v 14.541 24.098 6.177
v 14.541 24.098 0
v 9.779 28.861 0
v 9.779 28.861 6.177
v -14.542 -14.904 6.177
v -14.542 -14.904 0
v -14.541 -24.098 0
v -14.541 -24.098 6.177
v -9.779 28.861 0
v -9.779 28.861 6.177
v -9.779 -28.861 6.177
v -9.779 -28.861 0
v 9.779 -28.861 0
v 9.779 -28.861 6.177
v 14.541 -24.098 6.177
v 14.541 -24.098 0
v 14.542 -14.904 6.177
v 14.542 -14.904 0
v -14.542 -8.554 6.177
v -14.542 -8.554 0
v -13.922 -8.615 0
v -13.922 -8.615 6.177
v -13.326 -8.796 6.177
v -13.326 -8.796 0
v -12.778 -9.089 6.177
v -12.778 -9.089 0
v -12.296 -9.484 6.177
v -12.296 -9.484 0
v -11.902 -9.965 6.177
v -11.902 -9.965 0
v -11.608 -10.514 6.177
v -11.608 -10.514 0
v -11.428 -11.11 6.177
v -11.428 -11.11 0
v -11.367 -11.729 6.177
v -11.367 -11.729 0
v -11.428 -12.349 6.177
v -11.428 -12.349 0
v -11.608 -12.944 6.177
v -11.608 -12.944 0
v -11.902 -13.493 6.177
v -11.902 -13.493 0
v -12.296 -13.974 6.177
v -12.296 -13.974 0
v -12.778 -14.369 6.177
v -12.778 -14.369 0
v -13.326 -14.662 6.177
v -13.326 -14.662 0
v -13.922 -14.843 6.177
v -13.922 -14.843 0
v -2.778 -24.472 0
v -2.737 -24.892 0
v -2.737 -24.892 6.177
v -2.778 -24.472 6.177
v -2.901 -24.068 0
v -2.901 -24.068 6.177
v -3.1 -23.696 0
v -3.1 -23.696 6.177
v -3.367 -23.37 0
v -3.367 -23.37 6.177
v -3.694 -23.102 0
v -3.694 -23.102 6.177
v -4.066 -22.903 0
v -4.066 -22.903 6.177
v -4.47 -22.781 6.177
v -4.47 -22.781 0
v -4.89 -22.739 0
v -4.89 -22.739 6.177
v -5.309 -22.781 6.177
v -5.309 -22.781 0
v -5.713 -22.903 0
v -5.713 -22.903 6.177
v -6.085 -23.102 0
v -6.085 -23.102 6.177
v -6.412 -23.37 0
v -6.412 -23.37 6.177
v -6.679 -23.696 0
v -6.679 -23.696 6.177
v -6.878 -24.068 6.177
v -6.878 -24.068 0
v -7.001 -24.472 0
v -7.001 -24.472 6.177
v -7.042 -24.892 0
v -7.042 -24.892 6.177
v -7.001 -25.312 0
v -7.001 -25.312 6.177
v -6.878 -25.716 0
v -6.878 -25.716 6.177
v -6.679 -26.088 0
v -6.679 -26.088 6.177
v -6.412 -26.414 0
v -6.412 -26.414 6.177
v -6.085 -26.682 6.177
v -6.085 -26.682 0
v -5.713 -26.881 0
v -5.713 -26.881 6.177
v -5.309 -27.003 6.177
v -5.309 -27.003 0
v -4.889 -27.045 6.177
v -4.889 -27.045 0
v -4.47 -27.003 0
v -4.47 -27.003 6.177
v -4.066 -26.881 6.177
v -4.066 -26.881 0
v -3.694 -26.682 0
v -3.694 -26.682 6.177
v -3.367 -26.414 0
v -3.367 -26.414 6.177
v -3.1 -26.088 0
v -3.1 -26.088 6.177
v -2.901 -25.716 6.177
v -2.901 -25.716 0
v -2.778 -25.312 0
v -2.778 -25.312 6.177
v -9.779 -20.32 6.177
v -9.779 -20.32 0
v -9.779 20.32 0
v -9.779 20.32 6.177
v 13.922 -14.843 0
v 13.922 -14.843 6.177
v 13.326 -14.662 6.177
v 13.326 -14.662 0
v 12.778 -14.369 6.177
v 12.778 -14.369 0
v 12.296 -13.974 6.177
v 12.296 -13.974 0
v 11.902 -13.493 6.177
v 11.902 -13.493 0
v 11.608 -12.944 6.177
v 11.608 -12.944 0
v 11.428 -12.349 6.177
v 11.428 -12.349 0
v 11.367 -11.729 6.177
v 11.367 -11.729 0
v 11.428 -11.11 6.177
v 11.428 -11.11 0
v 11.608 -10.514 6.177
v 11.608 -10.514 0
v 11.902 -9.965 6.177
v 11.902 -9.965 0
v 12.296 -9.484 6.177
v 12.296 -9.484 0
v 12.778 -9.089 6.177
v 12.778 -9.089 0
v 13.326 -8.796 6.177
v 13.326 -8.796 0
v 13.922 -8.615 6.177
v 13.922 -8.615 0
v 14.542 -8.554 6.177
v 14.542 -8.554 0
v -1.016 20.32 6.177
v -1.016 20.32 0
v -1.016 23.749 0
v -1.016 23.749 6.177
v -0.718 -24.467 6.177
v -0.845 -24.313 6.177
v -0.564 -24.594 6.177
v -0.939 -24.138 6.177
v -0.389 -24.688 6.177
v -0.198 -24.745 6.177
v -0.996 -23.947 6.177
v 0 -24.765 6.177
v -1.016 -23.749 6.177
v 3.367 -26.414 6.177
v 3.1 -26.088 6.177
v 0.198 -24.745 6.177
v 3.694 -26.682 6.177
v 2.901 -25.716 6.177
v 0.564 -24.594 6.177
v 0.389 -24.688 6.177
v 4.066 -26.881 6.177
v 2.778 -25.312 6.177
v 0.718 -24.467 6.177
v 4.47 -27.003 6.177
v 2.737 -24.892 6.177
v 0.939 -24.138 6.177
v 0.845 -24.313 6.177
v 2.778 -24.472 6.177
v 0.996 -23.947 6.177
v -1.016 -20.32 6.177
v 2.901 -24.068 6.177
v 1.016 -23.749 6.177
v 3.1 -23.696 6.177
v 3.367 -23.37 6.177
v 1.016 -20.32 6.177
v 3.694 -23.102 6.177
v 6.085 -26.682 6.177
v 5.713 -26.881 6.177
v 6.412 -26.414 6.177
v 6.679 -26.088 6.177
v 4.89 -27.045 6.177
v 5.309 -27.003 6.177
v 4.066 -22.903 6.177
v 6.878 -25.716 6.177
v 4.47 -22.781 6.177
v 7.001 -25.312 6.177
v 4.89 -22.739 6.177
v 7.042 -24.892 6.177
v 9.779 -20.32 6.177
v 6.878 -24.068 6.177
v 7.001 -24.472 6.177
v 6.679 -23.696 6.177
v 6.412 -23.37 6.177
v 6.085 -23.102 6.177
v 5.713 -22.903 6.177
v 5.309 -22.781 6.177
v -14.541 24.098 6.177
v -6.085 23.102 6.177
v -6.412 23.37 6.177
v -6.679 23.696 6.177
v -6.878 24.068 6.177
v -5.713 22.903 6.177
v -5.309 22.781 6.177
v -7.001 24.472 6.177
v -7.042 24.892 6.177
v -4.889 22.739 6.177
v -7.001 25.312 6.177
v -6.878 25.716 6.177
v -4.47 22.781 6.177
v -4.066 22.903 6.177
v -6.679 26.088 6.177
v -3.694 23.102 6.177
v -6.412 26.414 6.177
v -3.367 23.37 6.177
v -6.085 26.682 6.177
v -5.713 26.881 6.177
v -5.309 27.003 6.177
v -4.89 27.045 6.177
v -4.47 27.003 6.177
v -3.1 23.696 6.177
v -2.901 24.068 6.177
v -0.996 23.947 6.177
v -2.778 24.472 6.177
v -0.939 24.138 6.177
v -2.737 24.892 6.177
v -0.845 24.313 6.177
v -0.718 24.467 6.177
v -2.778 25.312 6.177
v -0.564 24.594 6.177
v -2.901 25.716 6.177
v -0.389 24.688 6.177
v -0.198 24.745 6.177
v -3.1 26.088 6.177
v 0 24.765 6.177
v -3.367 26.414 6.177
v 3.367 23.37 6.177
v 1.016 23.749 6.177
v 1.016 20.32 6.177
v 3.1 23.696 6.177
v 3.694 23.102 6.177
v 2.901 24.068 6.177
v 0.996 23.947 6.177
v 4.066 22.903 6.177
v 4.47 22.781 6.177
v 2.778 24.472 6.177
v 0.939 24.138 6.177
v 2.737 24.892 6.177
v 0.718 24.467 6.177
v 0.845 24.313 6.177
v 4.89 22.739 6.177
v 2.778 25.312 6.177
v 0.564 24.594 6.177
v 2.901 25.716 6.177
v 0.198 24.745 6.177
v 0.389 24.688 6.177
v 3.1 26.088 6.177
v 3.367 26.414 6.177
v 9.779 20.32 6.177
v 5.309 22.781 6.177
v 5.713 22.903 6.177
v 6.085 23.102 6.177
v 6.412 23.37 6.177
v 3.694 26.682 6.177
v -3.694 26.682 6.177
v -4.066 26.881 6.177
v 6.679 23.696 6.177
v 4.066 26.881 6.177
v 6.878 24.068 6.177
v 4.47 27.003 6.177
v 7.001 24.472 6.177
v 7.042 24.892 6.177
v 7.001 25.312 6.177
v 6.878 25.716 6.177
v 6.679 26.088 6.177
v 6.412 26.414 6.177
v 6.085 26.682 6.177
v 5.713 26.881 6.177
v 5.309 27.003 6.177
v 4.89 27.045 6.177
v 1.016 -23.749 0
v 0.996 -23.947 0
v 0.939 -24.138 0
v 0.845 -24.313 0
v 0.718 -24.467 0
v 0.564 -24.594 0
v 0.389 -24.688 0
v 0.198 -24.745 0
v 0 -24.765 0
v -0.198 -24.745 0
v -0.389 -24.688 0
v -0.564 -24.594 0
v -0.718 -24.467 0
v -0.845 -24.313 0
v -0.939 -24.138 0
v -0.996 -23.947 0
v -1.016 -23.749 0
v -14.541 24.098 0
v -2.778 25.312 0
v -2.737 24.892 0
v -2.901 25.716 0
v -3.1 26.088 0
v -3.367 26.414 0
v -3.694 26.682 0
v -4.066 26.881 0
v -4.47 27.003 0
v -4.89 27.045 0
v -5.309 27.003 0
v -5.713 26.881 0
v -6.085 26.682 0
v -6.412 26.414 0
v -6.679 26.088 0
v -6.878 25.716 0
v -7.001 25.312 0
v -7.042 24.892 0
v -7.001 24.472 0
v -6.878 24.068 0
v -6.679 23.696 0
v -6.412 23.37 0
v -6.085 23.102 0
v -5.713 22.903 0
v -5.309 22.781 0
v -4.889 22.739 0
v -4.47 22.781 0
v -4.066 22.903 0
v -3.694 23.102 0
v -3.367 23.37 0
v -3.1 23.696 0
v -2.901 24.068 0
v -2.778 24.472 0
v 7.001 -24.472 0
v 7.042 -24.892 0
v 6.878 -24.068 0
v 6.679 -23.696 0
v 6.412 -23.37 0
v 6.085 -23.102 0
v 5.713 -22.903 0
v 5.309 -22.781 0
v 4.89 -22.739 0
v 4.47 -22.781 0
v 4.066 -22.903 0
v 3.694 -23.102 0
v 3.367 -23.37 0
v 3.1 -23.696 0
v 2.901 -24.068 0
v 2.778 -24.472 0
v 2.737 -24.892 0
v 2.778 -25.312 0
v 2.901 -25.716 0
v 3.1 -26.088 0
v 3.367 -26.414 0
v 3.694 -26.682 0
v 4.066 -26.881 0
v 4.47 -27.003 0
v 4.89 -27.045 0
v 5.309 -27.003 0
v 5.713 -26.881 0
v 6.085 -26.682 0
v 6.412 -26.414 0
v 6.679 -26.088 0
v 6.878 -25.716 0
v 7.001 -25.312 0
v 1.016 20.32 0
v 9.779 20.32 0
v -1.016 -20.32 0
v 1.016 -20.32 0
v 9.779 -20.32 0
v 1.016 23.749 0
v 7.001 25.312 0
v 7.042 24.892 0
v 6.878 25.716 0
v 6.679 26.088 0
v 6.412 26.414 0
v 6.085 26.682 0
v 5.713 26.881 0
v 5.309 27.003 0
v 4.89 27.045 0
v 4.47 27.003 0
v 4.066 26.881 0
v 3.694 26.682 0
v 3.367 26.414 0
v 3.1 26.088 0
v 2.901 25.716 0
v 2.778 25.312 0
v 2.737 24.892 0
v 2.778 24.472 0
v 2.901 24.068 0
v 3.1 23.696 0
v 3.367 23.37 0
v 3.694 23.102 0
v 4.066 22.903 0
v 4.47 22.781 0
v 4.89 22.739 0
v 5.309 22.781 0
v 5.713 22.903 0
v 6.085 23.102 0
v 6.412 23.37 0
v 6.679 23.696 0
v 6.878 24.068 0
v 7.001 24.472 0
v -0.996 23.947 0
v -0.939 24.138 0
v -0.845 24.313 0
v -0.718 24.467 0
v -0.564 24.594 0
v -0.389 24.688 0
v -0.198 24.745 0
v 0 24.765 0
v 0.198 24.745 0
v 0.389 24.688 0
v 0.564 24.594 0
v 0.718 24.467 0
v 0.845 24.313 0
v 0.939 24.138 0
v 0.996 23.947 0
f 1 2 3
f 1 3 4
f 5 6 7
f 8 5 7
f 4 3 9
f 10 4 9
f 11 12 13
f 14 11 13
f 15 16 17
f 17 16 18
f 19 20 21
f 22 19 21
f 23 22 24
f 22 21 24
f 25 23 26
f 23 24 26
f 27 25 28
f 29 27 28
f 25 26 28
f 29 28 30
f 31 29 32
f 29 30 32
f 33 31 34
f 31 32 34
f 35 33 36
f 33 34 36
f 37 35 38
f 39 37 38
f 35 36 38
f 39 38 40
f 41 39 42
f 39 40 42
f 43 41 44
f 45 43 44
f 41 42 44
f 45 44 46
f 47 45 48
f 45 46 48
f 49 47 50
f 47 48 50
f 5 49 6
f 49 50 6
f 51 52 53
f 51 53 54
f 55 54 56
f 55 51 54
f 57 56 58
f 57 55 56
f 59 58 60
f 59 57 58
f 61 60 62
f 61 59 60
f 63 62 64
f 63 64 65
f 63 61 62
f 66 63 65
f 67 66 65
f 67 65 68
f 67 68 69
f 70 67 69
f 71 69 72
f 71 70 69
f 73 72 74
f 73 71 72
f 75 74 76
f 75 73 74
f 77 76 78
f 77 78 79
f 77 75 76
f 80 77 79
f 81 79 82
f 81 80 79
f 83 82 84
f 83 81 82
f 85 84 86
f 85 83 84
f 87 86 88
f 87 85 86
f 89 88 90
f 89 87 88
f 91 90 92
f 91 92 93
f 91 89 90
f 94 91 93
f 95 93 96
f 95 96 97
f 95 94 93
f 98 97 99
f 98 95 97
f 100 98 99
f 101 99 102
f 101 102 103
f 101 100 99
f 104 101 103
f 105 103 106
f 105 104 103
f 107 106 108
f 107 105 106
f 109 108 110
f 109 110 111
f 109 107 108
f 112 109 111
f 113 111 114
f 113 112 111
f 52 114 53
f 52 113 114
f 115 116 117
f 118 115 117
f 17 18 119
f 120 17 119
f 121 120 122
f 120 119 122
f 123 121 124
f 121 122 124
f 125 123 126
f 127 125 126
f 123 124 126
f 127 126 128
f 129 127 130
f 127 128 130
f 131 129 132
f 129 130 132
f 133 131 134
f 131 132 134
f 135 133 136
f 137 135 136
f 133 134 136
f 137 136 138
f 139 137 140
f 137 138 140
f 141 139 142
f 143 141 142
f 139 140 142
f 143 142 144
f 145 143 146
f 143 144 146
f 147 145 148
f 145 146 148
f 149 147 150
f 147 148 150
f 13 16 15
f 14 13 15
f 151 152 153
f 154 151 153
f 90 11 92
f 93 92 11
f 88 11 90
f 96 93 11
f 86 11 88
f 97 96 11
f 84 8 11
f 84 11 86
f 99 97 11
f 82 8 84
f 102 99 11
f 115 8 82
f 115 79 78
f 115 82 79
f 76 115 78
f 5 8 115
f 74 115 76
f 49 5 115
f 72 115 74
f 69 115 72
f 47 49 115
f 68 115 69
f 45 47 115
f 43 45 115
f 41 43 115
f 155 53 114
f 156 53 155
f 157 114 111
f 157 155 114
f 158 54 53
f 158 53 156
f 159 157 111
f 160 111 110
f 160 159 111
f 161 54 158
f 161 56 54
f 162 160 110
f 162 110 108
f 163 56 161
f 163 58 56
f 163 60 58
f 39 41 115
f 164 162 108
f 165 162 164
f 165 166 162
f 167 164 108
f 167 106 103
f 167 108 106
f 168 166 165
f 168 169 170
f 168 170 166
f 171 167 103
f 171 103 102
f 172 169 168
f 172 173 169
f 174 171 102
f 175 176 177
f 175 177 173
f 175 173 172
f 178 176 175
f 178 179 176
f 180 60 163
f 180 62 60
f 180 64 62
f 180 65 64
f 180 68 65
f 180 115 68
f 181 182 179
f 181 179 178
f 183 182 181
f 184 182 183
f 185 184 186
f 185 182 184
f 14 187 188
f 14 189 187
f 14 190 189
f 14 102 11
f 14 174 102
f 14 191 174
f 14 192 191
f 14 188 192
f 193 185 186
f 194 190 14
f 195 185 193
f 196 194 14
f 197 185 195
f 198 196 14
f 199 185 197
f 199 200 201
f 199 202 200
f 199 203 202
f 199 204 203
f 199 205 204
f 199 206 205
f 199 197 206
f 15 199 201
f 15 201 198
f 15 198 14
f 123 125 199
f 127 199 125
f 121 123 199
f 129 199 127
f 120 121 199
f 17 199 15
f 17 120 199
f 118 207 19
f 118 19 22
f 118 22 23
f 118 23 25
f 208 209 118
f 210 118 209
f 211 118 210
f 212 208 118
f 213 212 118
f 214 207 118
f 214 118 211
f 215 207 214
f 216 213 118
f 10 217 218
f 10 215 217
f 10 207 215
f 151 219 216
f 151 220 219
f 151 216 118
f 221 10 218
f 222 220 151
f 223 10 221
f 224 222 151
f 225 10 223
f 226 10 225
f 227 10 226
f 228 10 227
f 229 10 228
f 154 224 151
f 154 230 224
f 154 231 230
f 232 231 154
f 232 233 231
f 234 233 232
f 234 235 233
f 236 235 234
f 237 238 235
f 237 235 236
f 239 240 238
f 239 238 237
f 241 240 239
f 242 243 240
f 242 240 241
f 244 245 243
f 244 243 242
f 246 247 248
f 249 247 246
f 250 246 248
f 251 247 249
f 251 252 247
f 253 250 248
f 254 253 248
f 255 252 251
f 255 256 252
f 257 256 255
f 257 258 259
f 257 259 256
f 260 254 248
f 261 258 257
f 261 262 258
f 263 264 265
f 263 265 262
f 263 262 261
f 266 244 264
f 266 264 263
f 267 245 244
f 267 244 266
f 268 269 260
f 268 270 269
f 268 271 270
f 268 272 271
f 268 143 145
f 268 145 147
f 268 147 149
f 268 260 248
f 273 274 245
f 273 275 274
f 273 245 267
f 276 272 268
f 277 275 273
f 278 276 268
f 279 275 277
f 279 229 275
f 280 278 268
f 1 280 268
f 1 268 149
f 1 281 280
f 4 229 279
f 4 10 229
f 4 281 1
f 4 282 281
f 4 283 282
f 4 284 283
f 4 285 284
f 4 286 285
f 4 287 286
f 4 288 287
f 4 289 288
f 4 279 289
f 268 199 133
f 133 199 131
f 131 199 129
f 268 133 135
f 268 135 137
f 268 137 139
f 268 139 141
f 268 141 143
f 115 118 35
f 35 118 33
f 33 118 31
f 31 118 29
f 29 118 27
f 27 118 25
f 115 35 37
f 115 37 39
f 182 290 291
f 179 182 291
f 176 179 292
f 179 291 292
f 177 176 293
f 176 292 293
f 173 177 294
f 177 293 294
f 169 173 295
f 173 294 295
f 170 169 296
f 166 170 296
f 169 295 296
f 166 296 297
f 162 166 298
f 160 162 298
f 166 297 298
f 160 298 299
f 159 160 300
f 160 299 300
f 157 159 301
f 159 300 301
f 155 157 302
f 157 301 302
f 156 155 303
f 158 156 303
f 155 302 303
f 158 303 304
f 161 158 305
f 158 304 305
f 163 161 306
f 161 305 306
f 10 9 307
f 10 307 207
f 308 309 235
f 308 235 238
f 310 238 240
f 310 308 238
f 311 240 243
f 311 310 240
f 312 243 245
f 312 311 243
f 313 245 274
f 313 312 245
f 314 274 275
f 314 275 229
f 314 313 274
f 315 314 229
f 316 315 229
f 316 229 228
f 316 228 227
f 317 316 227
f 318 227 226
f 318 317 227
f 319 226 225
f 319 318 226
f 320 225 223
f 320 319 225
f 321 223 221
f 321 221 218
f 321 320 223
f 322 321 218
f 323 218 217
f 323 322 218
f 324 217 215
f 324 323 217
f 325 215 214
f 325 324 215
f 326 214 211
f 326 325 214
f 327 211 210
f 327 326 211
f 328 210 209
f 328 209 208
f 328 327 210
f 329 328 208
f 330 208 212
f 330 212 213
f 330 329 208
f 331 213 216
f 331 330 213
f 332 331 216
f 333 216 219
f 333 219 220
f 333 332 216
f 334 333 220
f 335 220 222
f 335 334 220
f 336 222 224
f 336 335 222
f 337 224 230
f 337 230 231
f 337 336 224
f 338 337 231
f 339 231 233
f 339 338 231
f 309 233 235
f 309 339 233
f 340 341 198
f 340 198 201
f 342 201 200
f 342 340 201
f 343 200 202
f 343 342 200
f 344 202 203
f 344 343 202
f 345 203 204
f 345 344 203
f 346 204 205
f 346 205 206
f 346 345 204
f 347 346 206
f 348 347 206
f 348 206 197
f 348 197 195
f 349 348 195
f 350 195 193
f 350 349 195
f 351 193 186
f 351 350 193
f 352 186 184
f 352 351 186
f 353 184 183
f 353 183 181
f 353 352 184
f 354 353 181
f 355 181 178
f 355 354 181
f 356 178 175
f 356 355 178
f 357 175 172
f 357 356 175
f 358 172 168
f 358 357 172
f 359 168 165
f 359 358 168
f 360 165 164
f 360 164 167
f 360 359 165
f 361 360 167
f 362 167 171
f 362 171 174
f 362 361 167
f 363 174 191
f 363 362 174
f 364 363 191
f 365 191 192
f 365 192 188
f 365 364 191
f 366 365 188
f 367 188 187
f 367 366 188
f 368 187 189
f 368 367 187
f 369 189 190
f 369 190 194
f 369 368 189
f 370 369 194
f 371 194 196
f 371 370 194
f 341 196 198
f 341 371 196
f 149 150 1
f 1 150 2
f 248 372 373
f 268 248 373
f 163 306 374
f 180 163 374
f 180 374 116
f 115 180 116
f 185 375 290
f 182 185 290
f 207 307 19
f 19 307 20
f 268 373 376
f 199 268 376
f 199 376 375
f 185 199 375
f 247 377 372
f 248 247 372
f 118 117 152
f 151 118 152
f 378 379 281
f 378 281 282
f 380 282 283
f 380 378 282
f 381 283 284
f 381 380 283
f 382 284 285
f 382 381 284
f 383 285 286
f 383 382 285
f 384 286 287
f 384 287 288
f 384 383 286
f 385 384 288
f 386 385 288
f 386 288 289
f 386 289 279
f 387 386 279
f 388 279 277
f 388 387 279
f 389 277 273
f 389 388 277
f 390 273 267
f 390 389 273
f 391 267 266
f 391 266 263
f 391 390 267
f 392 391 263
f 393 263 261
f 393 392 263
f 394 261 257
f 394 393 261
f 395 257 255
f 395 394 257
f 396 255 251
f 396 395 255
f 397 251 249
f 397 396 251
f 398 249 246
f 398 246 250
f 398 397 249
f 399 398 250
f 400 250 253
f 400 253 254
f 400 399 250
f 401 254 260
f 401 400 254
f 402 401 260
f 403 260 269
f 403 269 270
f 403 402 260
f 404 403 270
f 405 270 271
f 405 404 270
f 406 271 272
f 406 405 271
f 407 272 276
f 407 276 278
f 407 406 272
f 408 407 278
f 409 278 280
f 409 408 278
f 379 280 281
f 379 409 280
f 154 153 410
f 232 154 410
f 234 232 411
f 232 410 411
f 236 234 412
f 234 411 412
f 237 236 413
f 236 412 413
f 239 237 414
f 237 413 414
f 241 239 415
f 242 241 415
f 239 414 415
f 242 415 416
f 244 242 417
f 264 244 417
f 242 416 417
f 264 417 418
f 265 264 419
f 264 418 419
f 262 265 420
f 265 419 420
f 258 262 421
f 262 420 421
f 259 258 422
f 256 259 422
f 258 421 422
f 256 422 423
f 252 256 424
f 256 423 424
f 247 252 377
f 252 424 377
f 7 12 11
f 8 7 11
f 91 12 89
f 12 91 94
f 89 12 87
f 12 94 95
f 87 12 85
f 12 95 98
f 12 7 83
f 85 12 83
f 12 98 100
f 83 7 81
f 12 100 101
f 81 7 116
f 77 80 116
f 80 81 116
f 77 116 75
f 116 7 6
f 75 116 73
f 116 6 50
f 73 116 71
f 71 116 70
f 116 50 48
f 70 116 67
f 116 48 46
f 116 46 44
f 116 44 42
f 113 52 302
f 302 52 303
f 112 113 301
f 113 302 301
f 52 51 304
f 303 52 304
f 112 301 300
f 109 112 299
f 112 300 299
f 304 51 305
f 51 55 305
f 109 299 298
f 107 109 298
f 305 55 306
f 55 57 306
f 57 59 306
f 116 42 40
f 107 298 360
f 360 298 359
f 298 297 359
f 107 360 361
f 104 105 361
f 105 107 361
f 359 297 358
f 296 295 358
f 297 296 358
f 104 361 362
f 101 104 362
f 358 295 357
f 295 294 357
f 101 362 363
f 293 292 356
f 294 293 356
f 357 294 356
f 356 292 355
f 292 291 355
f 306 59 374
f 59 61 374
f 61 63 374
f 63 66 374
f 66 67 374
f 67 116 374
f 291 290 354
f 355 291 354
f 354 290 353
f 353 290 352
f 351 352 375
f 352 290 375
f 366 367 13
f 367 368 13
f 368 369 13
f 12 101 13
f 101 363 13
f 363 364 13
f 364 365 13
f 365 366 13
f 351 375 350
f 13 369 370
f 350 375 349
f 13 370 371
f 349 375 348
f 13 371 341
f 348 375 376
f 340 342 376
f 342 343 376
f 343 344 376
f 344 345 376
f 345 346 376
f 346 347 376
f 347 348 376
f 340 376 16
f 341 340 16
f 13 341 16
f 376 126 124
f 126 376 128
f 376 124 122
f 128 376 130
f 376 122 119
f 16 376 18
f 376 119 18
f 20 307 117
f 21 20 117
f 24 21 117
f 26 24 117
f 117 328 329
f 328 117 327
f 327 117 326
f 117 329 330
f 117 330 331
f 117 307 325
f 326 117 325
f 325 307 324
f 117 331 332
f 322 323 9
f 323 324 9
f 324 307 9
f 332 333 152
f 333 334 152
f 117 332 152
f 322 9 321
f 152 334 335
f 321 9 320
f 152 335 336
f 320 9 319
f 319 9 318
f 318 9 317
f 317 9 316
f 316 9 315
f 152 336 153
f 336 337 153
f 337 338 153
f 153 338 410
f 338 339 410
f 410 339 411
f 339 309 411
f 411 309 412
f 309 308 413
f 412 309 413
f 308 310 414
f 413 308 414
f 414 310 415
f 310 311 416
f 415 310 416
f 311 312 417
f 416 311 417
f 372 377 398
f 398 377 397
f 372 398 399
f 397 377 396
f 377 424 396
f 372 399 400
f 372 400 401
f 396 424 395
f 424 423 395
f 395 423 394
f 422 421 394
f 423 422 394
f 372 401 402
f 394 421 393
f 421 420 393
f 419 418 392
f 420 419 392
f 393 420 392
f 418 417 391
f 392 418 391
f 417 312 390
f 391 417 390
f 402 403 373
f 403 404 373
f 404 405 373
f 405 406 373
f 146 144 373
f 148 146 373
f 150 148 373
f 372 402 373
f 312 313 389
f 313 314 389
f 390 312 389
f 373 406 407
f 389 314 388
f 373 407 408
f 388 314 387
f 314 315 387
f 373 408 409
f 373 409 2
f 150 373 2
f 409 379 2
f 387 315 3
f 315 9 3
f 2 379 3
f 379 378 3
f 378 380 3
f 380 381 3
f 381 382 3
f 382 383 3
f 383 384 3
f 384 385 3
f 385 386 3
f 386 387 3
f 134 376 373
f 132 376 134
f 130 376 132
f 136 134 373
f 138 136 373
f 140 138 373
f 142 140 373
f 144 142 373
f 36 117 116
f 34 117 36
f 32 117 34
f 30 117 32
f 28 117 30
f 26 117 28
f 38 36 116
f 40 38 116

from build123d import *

# Parameters (mm, degrees)
F0_R     = 2.15265
F1_DEPTH = 6.17728
F2_SIZE  = 4.7625


with BuildPart() as f1:
    # F0 (on Top) → F1 (new body)
    with BuildSketch(Plane.XY):
        with BuildLine():
            ThreePointArc((-14.5415, -8.55411), (-11.3665, -11.72911), (-14.5415, -14.90411))
            Line((-14.5415, -14.90411), (-14.5415, -28.86075))
            Line((-14.5415, -28.86075), (14.5415, -28.86075))
            Line((14.5415, -28.86075), (14.5415, -14.90411))
            ThreePointArc((14.5415, -14.90411), (11.3665, -11.72911), (14.5415, -8.55411))
            Line((14.5415, -8.55411), (14.5415, 28.86075))
            Line((14.5415, 28.86075), (-14.5415, 28.86075))
            Line((-14.5415, 28.86075), (-14.5415, -8.55411))
        make_face()
        with Locations((-4.8895, -24.892)):
            Circle(F0_R, mode=Mode.SUBTRACT)
        with Locations((4.8895, -24.892)):
            Circle(F0_R, mode=Mode.SUBTRACT)
        with Locations((-4.8895, 24.892)):
            Circle(F0_R, mode=Mode.SUBTRACT)
        with BuildLine():
            Line((9.779, 20.32), (9.779, -20.32))
            Line((9.779, -20.32), (1.016, -20.32))
            Line((1.016, -20.32), (1.016, -23.749))
            ThreePointArc((1.016, -23.749), (0, -24.765), (-1.016, -23.749))
            Line((-1.016, -23.749), (-1.016, -20.32))
            Line((-1.016, -20.32), (-9.779, -20.32))
            Line((-9.779, -20.32), (-9.779, 20.32))
            Line((-9.779, 20.32), (-1.016, 20.32))
            Line((-1.016, 20.32), (-1.016, 23.749))
            ThreePointArc((-1.016, 23.749), (0, 24.765), (1.016, 23.749))
            Line((1.016, 23.749), (1.016, 20.32))
            Line((1.016, 20.32), (9.779, 20.32))
        make_face(mode=Mode.SUBTRACT)
        with Locations((4.8895, 24.892)):
            Circle(F0_R, mode=Mode.SUBTRACT)
    extrude(amount=F1_DEPTH)

    # F2
    f2_edges = [f1.edges().sort_by_distance(p)[0] for p in [
        (14.5415, -28.86075, 3.08864),
        (14.5415, 28.86075, 3.08864),
        (-14.5415, 28.86075, 3.08864),
        (-14.5415, -28.86075, 3.08864),
    ]]
    chamfer(f2_edges, length=F2_SIZE)


solid = f1.part
